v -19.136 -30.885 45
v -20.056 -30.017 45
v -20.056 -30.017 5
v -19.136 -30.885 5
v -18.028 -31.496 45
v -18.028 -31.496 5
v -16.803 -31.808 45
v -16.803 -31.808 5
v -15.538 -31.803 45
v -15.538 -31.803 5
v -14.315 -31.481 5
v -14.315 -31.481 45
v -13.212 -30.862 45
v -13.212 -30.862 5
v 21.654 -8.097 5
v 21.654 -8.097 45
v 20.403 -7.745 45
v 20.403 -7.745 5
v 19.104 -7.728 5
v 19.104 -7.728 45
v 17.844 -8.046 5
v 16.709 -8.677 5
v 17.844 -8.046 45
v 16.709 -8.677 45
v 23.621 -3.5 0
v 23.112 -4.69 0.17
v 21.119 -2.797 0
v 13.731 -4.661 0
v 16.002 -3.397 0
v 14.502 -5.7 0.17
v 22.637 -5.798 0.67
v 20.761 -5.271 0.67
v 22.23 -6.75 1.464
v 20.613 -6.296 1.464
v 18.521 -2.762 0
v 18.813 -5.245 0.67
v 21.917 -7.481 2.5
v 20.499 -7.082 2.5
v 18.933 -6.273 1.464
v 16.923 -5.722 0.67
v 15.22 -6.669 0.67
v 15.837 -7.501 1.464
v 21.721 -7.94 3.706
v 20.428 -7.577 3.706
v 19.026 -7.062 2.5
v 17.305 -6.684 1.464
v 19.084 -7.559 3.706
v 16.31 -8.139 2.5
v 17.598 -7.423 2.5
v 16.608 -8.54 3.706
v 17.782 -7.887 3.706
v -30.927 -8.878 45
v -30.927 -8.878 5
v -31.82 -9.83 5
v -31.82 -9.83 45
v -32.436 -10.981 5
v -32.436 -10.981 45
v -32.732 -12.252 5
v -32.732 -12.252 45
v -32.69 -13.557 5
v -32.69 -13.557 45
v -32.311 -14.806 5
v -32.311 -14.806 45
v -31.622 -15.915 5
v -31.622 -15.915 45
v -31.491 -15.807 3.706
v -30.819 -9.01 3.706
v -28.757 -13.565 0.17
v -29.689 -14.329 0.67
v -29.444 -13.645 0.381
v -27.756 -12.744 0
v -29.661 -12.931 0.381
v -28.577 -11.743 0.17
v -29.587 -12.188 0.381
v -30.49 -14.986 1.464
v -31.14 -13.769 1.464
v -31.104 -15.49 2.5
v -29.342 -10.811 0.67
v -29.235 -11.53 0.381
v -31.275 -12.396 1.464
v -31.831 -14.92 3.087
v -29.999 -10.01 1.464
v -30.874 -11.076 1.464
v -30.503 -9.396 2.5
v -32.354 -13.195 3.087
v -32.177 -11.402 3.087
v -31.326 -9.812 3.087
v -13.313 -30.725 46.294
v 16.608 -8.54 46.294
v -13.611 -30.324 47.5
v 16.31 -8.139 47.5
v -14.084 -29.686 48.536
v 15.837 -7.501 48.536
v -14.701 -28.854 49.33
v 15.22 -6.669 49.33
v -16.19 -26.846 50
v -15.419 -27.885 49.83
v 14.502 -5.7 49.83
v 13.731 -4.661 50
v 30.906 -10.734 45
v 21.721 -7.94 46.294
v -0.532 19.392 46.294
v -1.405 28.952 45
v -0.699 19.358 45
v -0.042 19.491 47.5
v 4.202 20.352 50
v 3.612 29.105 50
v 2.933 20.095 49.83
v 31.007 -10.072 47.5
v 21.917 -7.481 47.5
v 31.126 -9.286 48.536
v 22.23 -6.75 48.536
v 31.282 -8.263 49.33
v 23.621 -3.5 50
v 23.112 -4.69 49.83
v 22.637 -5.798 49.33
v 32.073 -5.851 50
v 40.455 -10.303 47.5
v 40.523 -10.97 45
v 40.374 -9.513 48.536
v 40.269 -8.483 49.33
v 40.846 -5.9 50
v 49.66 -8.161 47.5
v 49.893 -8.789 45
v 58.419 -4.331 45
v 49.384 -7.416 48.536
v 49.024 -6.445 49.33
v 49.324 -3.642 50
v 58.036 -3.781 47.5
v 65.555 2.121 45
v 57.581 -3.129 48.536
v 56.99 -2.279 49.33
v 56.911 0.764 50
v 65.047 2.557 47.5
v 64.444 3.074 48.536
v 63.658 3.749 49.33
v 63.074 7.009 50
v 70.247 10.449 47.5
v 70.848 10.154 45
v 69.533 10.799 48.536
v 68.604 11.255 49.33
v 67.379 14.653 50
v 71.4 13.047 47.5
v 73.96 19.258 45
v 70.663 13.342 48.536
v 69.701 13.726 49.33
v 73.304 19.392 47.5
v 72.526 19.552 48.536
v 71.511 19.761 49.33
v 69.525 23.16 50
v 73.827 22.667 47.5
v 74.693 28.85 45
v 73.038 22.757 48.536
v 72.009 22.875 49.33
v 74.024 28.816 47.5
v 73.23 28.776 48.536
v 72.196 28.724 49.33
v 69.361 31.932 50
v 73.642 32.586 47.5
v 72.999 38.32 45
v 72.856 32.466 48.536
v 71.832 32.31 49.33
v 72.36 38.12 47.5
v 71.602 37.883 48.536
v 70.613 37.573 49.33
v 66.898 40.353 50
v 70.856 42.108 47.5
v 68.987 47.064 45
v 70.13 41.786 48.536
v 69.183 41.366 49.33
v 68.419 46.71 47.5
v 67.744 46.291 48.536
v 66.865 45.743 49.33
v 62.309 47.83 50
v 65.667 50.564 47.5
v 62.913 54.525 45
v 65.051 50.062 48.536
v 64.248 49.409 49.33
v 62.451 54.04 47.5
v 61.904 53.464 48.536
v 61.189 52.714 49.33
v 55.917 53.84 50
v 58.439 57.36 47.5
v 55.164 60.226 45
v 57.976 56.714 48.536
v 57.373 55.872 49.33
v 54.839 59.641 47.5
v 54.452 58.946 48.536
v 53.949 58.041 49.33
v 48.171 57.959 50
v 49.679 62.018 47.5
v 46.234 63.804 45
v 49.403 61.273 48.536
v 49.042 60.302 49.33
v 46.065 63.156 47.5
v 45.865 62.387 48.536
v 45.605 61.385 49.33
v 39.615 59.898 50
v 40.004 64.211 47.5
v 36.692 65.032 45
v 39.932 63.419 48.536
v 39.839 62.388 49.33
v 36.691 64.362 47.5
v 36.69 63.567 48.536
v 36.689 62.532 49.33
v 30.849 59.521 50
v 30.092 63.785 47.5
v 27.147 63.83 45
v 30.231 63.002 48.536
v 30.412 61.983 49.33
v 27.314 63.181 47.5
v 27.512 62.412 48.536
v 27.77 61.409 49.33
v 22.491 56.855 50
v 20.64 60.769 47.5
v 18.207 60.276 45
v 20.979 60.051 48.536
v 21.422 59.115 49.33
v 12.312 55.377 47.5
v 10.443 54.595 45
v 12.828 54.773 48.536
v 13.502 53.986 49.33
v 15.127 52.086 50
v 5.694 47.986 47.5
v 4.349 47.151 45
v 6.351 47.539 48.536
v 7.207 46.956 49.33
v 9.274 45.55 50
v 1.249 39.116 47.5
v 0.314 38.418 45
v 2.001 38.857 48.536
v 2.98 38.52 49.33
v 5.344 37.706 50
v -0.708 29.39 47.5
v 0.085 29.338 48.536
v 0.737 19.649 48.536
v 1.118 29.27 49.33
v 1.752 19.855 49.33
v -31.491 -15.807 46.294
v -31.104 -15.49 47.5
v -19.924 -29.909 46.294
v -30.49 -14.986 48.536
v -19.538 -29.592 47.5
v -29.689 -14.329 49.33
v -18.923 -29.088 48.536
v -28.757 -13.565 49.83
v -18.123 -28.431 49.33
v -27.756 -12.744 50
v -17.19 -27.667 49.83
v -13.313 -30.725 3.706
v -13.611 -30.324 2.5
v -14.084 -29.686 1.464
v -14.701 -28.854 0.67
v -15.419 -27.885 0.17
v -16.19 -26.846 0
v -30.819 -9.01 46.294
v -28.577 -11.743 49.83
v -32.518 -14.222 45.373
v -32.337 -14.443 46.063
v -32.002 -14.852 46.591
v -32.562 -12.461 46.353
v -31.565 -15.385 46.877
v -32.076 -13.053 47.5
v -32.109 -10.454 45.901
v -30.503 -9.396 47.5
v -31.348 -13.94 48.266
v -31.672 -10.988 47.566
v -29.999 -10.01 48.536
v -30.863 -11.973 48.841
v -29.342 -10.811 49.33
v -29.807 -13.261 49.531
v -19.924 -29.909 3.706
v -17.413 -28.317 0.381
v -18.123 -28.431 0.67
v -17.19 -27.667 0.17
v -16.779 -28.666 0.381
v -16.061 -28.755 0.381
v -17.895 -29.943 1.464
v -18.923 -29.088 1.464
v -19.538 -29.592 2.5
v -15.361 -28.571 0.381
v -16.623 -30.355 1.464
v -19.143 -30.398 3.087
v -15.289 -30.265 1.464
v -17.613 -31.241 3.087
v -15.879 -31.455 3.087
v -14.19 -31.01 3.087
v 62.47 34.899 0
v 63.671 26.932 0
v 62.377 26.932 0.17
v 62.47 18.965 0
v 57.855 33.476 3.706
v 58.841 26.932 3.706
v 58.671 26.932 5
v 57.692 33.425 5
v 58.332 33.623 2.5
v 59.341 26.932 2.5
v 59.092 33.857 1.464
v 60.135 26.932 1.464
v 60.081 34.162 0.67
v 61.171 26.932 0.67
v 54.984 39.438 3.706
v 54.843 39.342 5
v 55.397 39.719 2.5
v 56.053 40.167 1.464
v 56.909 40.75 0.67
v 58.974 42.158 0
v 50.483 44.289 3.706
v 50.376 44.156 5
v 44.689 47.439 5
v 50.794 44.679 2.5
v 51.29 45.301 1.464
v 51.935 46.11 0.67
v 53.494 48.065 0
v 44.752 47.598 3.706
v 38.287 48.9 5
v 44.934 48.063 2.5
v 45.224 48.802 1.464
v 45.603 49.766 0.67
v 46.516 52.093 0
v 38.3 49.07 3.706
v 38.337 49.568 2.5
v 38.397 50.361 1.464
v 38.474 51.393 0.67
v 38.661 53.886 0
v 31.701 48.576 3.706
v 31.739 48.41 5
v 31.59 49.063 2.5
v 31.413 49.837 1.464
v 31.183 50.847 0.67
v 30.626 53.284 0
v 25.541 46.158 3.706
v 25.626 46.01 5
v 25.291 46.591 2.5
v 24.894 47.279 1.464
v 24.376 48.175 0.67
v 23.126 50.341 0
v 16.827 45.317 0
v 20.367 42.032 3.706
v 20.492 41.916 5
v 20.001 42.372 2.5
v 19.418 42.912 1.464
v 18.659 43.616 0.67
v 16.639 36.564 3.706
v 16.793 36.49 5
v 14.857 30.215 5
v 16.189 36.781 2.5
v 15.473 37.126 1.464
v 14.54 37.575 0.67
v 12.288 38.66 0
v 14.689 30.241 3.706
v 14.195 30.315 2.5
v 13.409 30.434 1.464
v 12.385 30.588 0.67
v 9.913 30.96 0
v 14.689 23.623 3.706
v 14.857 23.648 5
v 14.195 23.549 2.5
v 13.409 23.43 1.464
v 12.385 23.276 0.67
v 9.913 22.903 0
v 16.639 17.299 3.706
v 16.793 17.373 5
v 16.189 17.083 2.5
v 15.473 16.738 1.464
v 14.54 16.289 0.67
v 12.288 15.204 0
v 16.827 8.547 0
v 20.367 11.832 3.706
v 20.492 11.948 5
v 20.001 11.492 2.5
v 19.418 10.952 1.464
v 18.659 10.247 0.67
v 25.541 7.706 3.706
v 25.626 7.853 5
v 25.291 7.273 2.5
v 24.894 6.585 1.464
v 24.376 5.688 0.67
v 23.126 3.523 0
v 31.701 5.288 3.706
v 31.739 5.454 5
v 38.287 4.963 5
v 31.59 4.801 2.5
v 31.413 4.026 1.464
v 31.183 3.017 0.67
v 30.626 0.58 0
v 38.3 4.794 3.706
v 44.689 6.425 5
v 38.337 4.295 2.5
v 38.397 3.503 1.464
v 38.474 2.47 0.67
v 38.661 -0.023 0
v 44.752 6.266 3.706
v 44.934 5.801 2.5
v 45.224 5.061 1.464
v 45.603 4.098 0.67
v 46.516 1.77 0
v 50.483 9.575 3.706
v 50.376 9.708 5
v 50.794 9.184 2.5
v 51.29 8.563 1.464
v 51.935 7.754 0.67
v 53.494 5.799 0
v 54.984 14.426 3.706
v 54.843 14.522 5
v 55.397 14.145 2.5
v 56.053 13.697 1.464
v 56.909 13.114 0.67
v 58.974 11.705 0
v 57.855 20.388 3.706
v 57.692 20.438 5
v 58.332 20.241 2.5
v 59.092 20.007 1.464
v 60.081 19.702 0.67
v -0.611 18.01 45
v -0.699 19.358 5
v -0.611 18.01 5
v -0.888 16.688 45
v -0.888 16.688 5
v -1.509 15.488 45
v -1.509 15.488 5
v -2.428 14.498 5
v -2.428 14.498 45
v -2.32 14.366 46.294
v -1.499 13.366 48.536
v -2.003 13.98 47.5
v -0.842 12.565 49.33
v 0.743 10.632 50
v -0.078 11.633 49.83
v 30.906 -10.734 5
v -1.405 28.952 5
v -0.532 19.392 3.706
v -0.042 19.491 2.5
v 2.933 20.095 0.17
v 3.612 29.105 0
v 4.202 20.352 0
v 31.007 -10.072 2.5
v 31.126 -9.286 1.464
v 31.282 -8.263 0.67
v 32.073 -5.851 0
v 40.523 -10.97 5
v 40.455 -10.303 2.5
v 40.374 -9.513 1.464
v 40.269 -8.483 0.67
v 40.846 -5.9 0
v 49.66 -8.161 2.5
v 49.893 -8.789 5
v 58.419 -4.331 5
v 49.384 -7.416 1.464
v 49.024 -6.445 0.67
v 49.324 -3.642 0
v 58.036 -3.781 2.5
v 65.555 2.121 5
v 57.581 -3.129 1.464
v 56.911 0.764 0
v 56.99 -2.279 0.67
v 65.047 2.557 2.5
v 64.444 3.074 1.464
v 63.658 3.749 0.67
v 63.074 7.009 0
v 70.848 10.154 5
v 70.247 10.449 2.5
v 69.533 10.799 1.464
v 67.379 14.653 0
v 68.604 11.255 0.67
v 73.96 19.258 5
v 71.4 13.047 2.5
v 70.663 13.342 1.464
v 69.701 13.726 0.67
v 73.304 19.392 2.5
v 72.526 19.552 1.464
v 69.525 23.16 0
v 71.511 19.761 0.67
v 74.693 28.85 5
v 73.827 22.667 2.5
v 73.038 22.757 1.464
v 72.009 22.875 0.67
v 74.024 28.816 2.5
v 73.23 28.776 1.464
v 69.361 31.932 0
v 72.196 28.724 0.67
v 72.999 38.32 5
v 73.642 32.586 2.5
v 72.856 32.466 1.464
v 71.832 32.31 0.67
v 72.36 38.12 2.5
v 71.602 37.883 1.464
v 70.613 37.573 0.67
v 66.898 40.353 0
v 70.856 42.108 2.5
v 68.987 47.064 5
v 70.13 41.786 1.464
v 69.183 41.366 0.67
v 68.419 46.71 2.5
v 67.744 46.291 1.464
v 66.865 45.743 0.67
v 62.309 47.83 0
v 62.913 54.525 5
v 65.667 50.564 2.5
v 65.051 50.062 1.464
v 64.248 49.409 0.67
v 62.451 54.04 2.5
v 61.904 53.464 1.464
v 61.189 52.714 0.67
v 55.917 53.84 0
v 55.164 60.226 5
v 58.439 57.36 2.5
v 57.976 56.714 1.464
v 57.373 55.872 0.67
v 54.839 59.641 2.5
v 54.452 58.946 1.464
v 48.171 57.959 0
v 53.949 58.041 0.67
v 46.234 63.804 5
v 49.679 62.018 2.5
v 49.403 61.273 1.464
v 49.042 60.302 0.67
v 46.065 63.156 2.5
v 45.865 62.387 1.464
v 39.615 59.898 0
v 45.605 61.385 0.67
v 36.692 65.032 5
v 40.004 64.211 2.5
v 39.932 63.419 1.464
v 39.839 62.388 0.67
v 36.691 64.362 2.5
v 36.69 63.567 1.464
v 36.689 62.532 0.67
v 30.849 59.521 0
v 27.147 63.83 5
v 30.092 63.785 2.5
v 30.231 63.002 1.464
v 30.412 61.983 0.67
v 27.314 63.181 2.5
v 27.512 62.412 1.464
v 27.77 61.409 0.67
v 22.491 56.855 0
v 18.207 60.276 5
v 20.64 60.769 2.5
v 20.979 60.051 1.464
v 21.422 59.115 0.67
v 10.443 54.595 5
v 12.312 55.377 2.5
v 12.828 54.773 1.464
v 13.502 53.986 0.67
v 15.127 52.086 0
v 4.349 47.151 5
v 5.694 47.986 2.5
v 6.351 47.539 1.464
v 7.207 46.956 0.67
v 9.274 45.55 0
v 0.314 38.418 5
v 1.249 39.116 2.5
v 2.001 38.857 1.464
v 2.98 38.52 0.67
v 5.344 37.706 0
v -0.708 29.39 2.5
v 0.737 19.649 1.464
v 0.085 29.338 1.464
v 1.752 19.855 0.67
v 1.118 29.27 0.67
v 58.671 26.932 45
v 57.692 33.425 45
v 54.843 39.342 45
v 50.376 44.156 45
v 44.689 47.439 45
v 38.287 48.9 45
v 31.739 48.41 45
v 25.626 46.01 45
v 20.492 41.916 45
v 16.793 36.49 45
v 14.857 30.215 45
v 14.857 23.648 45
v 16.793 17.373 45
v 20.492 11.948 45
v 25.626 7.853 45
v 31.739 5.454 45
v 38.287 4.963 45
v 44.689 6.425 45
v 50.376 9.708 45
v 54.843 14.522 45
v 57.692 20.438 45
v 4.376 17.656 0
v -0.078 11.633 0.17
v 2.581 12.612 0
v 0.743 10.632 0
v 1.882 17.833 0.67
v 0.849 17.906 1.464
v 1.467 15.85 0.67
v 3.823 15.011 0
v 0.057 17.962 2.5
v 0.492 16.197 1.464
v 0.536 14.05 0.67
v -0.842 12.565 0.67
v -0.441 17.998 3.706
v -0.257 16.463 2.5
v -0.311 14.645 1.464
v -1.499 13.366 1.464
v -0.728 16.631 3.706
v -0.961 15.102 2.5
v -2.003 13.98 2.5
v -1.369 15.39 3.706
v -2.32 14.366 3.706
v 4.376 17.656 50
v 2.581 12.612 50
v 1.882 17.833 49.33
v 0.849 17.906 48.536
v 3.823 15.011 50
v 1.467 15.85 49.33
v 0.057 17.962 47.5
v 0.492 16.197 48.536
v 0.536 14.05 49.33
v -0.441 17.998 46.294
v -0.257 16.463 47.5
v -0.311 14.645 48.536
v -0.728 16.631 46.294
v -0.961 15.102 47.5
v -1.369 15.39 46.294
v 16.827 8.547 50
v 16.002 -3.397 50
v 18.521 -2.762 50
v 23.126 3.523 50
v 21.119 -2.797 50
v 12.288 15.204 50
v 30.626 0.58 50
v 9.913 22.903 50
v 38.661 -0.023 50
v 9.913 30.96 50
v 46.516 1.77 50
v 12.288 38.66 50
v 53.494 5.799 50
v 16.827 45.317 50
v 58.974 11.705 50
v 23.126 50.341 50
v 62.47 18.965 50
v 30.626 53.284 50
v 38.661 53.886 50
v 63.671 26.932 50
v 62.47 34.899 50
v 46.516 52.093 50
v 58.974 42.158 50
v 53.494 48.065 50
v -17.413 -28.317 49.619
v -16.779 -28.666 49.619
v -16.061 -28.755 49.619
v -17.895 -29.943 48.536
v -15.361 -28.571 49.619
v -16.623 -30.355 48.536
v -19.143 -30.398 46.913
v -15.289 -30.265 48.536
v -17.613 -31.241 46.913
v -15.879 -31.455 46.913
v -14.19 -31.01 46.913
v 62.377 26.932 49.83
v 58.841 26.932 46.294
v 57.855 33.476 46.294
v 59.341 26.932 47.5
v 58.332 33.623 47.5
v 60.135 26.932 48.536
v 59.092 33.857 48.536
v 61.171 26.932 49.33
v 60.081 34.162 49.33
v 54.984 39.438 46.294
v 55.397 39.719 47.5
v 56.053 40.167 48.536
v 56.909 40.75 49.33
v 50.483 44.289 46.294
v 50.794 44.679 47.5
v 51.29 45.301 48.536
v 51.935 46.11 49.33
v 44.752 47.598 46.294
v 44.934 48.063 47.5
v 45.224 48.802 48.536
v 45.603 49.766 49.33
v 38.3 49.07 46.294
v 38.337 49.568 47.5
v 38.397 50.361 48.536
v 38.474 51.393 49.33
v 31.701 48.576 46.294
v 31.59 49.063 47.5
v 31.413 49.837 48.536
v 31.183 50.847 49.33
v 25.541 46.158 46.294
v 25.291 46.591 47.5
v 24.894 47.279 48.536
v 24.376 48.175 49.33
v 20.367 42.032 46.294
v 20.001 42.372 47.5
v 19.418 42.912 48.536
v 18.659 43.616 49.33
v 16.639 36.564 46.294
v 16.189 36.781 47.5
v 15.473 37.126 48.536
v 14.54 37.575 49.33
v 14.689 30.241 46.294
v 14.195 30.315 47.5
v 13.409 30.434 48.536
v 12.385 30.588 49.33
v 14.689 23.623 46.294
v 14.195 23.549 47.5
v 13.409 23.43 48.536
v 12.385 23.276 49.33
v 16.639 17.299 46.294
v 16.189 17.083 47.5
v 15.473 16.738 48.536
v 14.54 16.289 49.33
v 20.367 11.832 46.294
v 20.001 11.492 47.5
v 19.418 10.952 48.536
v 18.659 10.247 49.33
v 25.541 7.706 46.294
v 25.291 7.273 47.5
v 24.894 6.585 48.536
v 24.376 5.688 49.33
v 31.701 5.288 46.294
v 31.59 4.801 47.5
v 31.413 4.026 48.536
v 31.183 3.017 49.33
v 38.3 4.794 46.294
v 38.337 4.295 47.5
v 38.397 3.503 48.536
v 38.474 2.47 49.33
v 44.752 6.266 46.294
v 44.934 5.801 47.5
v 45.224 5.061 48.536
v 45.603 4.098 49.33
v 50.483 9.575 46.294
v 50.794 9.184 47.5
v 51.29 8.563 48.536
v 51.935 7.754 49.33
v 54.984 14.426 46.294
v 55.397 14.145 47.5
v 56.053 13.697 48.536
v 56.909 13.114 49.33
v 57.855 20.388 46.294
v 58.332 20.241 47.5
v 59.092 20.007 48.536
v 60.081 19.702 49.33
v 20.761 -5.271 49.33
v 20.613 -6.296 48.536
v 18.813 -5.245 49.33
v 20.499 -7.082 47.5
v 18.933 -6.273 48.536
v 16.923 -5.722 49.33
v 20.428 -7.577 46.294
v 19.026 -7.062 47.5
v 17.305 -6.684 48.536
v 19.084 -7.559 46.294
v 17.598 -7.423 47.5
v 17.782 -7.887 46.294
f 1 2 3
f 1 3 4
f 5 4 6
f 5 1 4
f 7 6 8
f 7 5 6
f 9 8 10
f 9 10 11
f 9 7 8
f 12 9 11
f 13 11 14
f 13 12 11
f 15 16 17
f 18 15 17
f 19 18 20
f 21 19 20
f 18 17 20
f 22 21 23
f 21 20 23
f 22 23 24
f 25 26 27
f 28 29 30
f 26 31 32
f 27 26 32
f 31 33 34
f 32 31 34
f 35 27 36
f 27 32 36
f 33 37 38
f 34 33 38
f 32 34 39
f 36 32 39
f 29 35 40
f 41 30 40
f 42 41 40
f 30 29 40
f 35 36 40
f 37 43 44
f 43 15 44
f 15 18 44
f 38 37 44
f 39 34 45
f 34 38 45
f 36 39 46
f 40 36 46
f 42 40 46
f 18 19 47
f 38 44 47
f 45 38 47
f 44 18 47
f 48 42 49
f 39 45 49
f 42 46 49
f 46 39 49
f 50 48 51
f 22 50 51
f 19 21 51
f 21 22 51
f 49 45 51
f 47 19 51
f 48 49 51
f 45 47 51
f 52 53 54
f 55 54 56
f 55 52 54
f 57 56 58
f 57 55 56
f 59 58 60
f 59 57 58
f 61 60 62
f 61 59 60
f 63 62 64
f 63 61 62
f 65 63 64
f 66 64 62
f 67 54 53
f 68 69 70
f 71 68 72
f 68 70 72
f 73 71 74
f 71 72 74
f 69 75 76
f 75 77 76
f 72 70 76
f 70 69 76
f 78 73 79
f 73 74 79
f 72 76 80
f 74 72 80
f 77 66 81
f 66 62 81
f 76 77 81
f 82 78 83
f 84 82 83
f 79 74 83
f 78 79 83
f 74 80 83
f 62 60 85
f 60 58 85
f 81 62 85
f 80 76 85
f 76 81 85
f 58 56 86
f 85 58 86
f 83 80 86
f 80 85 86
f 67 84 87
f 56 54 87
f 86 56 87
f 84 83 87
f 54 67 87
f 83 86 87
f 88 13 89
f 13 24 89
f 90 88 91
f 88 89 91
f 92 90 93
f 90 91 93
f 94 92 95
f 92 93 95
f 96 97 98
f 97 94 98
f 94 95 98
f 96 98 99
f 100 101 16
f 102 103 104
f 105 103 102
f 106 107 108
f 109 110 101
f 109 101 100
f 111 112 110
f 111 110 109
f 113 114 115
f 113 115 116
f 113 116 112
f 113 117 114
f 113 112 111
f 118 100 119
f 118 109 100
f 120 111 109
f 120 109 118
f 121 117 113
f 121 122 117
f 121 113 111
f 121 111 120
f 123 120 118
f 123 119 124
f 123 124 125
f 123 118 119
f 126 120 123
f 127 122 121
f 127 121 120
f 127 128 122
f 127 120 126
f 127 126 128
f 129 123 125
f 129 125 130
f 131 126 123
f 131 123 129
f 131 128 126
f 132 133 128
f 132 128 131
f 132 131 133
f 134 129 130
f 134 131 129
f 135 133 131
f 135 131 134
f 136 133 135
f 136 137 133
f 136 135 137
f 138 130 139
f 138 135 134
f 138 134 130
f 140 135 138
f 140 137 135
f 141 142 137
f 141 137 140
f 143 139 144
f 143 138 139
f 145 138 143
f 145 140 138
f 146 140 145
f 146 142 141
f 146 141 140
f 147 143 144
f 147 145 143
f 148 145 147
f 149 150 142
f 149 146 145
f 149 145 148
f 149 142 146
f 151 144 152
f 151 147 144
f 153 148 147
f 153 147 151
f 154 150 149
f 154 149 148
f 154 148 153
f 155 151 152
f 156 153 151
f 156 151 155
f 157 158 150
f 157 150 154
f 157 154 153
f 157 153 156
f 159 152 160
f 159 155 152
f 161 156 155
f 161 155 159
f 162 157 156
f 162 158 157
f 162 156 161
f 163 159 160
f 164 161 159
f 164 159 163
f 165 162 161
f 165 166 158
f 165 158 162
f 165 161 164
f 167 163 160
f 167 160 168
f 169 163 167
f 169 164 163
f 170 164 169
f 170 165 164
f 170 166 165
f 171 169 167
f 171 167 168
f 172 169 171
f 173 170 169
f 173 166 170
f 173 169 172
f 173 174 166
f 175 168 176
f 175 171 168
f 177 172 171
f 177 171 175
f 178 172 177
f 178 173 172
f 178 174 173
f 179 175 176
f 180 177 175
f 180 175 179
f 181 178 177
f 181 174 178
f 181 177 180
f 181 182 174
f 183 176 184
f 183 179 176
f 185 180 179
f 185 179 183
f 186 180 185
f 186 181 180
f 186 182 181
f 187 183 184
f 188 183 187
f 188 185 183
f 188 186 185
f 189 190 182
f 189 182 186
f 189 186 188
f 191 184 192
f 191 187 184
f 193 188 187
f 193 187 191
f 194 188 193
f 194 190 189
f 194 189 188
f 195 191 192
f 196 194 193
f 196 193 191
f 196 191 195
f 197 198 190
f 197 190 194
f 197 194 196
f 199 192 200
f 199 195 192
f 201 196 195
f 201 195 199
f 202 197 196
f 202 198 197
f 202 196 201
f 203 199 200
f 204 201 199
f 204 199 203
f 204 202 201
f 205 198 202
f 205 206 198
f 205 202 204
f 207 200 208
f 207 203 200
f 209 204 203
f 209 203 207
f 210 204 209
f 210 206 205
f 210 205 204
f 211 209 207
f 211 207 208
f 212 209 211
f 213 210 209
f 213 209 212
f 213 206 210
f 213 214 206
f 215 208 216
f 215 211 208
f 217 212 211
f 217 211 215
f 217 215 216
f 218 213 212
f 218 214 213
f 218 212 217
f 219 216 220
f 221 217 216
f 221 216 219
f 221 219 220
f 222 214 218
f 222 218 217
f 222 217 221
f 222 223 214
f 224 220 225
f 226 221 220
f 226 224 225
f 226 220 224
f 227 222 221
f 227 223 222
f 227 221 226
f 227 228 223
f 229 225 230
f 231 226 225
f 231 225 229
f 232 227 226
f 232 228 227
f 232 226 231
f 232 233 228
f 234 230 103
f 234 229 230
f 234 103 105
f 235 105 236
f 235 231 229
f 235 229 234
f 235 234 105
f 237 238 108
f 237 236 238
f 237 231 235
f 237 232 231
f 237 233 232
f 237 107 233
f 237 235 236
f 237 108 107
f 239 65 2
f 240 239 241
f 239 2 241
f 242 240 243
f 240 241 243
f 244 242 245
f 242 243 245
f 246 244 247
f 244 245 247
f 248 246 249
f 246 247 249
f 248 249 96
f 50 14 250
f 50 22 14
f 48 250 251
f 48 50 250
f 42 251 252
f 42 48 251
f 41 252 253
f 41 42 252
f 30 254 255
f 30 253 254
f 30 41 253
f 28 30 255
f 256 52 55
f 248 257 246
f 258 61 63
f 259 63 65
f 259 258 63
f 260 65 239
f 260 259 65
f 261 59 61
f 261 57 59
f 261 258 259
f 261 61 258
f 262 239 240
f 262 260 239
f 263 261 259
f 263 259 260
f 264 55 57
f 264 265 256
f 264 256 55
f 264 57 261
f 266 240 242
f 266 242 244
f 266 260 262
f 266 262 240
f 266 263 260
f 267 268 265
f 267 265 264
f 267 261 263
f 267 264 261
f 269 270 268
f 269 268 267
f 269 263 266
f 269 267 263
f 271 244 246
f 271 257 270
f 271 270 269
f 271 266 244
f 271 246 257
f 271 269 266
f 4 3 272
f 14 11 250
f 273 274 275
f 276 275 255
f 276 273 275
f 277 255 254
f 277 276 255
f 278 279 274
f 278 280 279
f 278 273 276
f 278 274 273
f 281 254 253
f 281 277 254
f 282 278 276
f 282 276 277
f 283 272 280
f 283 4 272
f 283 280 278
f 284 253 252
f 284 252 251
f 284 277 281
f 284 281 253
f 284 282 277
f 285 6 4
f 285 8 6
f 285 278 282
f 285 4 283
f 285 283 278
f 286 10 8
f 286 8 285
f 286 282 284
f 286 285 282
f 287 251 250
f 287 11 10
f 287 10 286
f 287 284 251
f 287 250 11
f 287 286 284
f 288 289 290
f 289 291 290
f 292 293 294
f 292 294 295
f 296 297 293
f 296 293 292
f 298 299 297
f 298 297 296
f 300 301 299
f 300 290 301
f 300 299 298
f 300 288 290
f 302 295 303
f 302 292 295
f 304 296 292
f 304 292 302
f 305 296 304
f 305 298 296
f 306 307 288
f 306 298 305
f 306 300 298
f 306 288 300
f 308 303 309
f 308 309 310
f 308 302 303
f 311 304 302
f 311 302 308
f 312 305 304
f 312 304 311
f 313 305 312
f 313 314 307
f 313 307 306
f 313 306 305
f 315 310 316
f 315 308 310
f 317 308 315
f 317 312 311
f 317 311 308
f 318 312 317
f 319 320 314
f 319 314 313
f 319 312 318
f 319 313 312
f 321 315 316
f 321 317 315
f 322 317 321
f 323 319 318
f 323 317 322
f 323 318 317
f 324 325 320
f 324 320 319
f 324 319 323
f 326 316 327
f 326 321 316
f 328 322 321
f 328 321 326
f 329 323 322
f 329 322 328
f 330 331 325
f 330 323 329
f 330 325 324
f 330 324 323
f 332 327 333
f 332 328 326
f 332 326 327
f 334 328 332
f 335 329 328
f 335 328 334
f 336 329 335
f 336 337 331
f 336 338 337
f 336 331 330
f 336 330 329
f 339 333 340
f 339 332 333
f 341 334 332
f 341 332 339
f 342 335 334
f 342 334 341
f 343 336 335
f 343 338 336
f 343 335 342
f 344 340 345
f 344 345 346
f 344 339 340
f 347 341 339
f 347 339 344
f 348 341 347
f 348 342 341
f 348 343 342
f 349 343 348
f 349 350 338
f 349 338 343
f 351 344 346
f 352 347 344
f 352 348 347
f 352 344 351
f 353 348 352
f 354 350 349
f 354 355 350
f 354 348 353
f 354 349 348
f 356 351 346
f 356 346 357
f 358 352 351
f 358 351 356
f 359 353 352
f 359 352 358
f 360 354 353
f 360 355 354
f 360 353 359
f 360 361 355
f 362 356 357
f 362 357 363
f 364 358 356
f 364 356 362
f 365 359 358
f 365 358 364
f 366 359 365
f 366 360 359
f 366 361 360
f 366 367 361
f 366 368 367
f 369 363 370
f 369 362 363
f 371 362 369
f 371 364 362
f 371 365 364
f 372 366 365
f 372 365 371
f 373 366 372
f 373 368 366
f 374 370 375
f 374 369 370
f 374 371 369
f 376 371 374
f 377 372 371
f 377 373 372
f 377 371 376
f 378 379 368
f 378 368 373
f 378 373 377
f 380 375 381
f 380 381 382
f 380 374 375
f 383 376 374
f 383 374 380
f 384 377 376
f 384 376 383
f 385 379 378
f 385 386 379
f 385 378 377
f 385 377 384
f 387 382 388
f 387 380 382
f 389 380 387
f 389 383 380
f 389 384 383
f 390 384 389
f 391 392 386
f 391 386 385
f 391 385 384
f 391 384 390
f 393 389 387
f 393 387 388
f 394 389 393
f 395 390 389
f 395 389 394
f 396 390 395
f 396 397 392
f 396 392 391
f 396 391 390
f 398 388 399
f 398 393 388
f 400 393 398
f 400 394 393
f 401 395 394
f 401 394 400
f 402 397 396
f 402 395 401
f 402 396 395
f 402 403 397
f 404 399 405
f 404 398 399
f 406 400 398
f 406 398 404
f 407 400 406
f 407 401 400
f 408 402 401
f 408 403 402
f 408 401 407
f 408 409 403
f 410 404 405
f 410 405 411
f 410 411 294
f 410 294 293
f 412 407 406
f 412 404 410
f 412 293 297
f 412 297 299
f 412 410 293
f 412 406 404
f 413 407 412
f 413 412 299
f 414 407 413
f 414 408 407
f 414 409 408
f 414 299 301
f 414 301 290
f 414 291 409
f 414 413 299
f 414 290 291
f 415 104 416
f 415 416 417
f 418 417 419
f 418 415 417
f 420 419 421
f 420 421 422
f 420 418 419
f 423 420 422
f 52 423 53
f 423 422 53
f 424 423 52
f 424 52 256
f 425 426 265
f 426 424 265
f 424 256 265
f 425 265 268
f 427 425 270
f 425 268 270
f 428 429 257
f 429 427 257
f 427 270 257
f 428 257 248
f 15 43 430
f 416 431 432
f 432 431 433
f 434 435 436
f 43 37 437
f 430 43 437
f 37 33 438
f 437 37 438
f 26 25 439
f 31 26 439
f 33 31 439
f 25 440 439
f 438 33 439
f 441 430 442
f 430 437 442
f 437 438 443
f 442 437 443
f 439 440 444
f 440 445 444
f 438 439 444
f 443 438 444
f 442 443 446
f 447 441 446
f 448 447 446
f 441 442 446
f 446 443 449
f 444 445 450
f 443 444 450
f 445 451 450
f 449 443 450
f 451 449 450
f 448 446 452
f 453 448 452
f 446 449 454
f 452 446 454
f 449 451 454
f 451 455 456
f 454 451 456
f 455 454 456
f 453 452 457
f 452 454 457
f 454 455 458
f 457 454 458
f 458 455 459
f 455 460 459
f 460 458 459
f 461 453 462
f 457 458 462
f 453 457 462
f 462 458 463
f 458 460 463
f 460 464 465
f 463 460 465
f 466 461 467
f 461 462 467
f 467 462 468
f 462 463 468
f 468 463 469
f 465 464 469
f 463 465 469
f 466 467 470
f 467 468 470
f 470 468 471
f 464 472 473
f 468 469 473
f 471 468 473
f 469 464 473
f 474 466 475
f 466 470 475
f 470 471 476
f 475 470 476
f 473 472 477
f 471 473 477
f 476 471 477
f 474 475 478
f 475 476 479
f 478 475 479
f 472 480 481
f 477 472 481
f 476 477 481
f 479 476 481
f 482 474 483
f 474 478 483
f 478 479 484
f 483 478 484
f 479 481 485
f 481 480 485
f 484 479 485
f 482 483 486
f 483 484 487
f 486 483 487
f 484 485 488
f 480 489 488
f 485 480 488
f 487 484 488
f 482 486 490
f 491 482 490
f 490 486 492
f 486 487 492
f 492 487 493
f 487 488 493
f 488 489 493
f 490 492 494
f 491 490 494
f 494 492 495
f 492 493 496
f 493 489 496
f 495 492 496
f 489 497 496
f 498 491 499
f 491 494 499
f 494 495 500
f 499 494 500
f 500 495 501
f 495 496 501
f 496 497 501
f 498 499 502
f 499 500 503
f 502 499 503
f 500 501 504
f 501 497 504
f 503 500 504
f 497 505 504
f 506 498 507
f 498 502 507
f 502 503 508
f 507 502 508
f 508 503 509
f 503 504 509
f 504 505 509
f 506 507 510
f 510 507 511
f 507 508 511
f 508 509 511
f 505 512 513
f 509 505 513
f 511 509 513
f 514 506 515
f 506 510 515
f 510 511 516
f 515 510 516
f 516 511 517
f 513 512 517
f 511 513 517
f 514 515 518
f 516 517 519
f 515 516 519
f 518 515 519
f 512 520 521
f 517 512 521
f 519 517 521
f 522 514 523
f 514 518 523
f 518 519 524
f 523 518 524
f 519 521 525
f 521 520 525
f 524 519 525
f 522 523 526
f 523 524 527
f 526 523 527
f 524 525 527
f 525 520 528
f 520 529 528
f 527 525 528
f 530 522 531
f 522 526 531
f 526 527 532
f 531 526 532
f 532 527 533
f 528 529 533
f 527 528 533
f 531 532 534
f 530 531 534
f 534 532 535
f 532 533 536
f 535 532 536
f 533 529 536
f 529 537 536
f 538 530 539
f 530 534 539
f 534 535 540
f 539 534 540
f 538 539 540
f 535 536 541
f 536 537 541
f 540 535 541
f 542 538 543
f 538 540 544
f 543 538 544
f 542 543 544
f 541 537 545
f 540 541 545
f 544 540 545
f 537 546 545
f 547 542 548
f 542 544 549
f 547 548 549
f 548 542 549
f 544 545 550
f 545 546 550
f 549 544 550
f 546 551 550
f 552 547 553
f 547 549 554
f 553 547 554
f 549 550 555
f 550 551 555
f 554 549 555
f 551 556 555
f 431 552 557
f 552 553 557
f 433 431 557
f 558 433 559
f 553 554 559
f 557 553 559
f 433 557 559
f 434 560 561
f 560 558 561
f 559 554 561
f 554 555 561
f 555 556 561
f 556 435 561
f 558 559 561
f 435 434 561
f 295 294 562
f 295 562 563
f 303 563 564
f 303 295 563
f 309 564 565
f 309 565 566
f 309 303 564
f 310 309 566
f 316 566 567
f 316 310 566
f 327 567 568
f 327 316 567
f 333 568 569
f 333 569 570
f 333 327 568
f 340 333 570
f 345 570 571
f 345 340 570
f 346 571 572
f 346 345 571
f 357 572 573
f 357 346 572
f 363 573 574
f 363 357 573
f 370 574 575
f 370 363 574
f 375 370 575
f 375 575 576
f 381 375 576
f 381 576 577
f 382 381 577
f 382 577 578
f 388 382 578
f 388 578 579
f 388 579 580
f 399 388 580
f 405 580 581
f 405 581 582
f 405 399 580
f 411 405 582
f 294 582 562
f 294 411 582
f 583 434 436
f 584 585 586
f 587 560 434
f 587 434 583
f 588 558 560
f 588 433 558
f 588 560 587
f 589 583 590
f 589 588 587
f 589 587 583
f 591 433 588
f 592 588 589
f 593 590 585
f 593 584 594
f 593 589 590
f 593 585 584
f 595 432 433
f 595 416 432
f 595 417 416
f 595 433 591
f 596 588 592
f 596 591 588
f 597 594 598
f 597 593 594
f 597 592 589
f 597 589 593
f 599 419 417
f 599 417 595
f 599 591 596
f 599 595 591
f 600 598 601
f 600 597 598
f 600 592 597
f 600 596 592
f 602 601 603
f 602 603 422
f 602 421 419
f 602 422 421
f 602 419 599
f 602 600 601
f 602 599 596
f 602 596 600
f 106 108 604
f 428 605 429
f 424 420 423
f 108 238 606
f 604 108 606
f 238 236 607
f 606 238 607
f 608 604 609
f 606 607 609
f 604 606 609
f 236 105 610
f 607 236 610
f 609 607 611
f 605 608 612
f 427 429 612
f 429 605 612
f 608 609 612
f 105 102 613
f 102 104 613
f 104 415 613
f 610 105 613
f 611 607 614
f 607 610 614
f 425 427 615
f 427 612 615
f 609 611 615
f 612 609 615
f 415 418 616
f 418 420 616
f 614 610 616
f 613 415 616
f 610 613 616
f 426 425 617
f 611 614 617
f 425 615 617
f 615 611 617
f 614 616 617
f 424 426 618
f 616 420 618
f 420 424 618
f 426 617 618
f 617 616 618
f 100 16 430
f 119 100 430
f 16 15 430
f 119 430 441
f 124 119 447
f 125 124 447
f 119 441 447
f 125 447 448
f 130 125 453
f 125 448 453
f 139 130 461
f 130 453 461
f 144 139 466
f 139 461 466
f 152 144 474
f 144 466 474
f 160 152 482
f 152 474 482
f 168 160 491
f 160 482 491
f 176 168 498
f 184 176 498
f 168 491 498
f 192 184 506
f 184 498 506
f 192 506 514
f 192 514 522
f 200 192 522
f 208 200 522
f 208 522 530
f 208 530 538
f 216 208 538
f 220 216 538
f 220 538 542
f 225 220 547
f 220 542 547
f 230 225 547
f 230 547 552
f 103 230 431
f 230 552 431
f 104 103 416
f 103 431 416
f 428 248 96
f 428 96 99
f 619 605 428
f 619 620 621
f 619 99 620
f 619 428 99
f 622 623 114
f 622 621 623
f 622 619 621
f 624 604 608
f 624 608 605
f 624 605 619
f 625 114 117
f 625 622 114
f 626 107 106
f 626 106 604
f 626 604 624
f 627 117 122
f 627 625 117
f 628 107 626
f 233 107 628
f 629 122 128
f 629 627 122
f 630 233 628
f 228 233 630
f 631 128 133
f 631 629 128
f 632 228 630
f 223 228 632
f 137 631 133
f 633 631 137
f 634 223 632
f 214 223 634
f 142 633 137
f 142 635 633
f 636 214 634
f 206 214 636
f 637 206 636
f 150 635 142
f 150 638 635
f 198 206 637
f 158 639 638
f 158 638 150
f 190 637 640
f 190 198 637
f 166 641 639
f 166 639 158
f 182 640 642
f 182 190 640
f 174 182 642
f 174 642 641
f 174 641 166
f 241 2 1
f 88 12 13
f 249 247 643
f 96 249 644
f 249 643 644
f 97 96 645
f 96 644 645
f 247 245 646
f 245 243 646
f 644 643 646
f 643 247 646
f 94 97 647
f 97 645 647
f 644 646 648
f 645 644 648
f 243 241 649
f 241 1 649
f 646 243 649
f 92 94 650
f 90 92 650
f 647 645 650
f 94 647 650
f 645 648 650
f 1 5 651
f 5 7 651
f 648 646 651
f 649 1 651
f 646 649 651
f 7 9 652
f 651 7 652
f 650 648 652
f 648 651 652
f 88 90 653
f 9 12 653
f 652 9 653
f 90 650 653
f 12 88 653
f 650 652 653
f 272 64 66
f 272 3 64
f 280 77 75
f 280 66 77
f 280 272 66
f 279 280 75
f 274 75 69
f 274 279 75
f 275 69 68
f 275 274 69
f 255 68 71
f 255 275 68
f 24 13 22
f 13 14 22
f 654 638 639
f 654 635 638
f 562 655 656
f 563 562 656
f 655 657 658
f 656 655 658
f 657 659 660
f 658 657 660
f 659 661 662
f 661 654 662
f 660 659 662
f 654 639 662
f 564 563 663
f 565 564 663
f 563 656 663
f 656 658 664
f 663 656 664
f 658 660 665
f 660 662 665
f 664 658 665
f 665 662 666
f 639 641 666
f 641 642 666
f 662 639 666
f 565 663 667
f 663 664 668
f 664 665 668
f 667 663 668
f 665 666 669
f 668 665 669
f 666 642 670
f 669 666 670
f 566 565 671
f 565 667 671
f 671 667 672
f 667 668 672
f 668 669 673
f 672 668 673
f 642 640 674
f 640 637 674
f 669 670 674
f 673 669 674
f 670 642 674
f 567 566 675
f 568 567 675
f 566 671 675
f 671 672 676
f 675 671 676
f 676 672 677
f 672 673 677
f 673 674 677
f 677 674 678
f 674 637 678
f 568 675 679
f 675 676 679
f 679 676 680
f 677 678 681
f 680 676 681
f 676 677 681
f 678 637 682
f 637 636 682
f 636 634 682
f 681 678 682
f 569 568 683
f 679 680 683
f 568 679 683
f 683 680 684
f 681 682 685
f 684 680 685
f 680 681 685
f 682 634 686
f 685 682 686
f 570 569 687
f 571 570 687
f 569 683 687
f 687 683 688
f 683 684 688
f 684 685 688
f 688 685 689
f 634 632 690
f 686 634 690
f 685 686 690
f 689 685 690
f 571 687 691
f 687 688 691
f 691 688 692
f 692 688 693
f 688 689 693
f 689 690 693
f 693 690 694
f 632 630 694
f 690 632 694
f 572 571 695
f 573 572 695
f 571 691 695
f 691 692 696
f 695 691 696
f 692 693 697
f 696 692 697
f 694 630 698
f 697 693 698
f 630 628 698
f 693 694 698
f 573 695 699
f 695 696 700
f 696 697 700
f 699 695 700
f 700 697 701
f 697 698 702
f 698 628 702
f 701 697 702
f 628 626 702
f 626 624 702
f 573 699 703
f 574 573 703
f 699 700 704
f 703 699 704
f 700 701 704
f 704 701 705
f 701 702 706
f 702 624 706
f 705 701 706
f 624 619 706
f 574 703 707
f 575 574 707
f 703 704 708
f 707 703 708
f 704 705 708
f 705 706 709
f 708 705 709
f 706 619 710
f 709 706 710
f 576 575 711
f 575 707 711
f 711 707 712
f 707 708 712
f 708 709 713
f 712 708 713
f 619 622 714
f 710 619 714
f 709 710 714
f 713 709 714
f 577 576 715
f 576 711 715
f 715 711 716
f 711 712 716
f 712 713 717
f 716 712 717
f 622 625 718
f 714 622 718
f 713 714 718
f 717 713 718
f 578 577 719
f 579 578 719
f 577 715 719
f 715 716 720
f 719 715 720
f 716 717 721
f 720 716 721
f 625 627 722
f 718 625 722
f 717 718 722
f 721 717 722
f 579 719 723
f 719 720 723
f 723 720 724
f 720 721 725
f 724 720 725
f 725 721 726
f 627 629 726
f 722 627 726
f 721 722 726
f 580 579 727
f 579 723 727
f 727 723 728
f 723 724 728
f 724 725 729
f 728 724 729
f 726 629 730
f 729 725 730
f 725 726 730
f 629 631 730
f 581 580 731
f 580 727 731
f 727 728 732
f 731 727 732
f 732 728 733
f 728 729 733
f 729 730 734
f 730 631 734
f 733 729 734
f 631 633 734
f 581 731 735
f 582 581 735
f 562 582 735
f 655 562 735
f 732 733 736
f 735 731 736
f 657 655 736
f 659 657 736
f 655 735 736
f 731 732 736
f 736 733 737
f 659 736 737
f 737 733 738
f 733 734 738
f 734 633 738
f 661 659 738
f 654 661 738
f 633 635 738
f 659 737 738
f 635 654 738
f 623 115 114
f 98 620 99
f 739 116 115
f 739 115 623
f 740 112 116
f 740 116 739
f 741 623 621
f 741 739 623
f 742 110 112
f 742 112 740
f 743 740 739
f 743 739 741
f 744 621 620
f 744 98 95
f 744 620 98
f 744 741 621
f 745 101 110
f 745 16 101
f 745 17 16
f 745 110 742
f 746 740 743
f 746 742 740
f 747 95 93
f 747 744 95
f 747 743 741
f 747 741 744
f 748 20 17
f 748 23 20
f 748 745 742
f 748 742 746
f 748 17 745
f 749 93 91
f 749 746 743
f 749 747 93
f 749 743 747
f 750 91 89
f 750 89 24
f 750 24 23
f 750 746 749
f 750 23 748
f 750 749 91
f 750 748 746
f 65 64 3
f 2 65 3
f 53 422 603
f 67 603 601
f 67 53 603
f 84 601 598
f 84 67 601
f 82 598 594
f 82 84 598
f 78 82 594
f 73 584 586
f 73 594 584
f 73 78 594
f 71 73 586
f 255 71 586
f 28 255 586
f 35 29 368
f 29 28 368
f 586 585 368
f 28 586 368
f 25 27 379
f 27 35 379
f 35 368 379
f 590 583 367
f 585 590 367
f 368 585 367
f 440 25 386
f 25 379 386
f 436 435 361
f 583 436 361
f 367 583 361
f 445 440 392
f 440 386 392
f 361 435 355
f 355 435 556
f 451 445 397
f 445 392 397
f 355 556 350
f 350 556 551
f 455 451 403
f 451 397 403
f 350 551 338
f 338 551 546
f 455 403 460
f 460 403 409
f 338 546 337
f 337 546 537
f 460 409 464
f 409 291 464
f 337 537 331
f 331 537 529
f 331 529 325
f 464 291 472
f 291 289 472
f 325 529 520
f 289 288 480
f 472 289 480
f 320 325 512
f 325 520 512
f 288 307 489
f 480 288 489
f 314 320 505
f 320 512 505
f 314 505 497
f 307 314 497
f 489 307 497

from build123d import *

# Parameters (mm, degrees)
F0_R     = 22.03
F1_DEPTH = 50
F2_R     = 5


with BuildPart() as f1:
    # F0 (on Top) → F1 (new body)
    with BuildSketch(Plane.XY):
        with BuildLine():
            ThreePointArc((19.111431778, -6.8960115293), (56.4366245885, -5.6218490797), (74.7410013376, 26.9318496366))
            ThreePointArc((74.7410013376, 26.9318496366), (31.369006979, 64.6653370911), (0, 16.4892914742))
            ThreePointArc((0, 16.4892914742), (7.1396320987, 2.8221168918), (19.111431778, -6.8960115293))
        make_face()
        with Locations((36.6410013376, 26.9318496366)):
            Circle(F0_R, mode=Mode.SUBTRACT)
        with BuildLine():
            ThreePointArc((19.111431778, -6.8960115293), (7.1396320987, 2.8221168918), (0, 16.4892914742))
            Line((0, 16.4892914742), (-34.7932870747, -12.0488790092))
            Line((-34.7932870747, -12.0488790092), (-17.0362032183, -33.6980354112))
            Line((-17.0362032183, -33.6980354112), (19.111431778, -6.8960115293))
        make_face()
    extrude(amount=F1_DEPTH)

    # F2
    f2_edges = [f1.edges().sort_by_distance(p)[0] for p in [
        (66.142371, 51.041582, 50),
        (14.611001, 26.93185, 50),
        (-17.396644, 2.220206, 50),
        (1.037614, -20.297023, 50),
        (0, 16.489291, 25),
        (-34.793287, -12.048879, 25),
        (19.111432, -6.896012, 25),
        (-17.036203, -33.698035, 25),
        (-25.914745, -22.873457, 0),
        (-25.914745, -22.873457, 50),
        (66.142371, 51.041582, 0),
        (14.611001, 26.93185, 0),
        (-17.396644, 2.220206, 0),
        (1.037614, -20.297023, 0),
    ]]
    fillet(f2_edges, radius=F2_R)


solid = f1.part
